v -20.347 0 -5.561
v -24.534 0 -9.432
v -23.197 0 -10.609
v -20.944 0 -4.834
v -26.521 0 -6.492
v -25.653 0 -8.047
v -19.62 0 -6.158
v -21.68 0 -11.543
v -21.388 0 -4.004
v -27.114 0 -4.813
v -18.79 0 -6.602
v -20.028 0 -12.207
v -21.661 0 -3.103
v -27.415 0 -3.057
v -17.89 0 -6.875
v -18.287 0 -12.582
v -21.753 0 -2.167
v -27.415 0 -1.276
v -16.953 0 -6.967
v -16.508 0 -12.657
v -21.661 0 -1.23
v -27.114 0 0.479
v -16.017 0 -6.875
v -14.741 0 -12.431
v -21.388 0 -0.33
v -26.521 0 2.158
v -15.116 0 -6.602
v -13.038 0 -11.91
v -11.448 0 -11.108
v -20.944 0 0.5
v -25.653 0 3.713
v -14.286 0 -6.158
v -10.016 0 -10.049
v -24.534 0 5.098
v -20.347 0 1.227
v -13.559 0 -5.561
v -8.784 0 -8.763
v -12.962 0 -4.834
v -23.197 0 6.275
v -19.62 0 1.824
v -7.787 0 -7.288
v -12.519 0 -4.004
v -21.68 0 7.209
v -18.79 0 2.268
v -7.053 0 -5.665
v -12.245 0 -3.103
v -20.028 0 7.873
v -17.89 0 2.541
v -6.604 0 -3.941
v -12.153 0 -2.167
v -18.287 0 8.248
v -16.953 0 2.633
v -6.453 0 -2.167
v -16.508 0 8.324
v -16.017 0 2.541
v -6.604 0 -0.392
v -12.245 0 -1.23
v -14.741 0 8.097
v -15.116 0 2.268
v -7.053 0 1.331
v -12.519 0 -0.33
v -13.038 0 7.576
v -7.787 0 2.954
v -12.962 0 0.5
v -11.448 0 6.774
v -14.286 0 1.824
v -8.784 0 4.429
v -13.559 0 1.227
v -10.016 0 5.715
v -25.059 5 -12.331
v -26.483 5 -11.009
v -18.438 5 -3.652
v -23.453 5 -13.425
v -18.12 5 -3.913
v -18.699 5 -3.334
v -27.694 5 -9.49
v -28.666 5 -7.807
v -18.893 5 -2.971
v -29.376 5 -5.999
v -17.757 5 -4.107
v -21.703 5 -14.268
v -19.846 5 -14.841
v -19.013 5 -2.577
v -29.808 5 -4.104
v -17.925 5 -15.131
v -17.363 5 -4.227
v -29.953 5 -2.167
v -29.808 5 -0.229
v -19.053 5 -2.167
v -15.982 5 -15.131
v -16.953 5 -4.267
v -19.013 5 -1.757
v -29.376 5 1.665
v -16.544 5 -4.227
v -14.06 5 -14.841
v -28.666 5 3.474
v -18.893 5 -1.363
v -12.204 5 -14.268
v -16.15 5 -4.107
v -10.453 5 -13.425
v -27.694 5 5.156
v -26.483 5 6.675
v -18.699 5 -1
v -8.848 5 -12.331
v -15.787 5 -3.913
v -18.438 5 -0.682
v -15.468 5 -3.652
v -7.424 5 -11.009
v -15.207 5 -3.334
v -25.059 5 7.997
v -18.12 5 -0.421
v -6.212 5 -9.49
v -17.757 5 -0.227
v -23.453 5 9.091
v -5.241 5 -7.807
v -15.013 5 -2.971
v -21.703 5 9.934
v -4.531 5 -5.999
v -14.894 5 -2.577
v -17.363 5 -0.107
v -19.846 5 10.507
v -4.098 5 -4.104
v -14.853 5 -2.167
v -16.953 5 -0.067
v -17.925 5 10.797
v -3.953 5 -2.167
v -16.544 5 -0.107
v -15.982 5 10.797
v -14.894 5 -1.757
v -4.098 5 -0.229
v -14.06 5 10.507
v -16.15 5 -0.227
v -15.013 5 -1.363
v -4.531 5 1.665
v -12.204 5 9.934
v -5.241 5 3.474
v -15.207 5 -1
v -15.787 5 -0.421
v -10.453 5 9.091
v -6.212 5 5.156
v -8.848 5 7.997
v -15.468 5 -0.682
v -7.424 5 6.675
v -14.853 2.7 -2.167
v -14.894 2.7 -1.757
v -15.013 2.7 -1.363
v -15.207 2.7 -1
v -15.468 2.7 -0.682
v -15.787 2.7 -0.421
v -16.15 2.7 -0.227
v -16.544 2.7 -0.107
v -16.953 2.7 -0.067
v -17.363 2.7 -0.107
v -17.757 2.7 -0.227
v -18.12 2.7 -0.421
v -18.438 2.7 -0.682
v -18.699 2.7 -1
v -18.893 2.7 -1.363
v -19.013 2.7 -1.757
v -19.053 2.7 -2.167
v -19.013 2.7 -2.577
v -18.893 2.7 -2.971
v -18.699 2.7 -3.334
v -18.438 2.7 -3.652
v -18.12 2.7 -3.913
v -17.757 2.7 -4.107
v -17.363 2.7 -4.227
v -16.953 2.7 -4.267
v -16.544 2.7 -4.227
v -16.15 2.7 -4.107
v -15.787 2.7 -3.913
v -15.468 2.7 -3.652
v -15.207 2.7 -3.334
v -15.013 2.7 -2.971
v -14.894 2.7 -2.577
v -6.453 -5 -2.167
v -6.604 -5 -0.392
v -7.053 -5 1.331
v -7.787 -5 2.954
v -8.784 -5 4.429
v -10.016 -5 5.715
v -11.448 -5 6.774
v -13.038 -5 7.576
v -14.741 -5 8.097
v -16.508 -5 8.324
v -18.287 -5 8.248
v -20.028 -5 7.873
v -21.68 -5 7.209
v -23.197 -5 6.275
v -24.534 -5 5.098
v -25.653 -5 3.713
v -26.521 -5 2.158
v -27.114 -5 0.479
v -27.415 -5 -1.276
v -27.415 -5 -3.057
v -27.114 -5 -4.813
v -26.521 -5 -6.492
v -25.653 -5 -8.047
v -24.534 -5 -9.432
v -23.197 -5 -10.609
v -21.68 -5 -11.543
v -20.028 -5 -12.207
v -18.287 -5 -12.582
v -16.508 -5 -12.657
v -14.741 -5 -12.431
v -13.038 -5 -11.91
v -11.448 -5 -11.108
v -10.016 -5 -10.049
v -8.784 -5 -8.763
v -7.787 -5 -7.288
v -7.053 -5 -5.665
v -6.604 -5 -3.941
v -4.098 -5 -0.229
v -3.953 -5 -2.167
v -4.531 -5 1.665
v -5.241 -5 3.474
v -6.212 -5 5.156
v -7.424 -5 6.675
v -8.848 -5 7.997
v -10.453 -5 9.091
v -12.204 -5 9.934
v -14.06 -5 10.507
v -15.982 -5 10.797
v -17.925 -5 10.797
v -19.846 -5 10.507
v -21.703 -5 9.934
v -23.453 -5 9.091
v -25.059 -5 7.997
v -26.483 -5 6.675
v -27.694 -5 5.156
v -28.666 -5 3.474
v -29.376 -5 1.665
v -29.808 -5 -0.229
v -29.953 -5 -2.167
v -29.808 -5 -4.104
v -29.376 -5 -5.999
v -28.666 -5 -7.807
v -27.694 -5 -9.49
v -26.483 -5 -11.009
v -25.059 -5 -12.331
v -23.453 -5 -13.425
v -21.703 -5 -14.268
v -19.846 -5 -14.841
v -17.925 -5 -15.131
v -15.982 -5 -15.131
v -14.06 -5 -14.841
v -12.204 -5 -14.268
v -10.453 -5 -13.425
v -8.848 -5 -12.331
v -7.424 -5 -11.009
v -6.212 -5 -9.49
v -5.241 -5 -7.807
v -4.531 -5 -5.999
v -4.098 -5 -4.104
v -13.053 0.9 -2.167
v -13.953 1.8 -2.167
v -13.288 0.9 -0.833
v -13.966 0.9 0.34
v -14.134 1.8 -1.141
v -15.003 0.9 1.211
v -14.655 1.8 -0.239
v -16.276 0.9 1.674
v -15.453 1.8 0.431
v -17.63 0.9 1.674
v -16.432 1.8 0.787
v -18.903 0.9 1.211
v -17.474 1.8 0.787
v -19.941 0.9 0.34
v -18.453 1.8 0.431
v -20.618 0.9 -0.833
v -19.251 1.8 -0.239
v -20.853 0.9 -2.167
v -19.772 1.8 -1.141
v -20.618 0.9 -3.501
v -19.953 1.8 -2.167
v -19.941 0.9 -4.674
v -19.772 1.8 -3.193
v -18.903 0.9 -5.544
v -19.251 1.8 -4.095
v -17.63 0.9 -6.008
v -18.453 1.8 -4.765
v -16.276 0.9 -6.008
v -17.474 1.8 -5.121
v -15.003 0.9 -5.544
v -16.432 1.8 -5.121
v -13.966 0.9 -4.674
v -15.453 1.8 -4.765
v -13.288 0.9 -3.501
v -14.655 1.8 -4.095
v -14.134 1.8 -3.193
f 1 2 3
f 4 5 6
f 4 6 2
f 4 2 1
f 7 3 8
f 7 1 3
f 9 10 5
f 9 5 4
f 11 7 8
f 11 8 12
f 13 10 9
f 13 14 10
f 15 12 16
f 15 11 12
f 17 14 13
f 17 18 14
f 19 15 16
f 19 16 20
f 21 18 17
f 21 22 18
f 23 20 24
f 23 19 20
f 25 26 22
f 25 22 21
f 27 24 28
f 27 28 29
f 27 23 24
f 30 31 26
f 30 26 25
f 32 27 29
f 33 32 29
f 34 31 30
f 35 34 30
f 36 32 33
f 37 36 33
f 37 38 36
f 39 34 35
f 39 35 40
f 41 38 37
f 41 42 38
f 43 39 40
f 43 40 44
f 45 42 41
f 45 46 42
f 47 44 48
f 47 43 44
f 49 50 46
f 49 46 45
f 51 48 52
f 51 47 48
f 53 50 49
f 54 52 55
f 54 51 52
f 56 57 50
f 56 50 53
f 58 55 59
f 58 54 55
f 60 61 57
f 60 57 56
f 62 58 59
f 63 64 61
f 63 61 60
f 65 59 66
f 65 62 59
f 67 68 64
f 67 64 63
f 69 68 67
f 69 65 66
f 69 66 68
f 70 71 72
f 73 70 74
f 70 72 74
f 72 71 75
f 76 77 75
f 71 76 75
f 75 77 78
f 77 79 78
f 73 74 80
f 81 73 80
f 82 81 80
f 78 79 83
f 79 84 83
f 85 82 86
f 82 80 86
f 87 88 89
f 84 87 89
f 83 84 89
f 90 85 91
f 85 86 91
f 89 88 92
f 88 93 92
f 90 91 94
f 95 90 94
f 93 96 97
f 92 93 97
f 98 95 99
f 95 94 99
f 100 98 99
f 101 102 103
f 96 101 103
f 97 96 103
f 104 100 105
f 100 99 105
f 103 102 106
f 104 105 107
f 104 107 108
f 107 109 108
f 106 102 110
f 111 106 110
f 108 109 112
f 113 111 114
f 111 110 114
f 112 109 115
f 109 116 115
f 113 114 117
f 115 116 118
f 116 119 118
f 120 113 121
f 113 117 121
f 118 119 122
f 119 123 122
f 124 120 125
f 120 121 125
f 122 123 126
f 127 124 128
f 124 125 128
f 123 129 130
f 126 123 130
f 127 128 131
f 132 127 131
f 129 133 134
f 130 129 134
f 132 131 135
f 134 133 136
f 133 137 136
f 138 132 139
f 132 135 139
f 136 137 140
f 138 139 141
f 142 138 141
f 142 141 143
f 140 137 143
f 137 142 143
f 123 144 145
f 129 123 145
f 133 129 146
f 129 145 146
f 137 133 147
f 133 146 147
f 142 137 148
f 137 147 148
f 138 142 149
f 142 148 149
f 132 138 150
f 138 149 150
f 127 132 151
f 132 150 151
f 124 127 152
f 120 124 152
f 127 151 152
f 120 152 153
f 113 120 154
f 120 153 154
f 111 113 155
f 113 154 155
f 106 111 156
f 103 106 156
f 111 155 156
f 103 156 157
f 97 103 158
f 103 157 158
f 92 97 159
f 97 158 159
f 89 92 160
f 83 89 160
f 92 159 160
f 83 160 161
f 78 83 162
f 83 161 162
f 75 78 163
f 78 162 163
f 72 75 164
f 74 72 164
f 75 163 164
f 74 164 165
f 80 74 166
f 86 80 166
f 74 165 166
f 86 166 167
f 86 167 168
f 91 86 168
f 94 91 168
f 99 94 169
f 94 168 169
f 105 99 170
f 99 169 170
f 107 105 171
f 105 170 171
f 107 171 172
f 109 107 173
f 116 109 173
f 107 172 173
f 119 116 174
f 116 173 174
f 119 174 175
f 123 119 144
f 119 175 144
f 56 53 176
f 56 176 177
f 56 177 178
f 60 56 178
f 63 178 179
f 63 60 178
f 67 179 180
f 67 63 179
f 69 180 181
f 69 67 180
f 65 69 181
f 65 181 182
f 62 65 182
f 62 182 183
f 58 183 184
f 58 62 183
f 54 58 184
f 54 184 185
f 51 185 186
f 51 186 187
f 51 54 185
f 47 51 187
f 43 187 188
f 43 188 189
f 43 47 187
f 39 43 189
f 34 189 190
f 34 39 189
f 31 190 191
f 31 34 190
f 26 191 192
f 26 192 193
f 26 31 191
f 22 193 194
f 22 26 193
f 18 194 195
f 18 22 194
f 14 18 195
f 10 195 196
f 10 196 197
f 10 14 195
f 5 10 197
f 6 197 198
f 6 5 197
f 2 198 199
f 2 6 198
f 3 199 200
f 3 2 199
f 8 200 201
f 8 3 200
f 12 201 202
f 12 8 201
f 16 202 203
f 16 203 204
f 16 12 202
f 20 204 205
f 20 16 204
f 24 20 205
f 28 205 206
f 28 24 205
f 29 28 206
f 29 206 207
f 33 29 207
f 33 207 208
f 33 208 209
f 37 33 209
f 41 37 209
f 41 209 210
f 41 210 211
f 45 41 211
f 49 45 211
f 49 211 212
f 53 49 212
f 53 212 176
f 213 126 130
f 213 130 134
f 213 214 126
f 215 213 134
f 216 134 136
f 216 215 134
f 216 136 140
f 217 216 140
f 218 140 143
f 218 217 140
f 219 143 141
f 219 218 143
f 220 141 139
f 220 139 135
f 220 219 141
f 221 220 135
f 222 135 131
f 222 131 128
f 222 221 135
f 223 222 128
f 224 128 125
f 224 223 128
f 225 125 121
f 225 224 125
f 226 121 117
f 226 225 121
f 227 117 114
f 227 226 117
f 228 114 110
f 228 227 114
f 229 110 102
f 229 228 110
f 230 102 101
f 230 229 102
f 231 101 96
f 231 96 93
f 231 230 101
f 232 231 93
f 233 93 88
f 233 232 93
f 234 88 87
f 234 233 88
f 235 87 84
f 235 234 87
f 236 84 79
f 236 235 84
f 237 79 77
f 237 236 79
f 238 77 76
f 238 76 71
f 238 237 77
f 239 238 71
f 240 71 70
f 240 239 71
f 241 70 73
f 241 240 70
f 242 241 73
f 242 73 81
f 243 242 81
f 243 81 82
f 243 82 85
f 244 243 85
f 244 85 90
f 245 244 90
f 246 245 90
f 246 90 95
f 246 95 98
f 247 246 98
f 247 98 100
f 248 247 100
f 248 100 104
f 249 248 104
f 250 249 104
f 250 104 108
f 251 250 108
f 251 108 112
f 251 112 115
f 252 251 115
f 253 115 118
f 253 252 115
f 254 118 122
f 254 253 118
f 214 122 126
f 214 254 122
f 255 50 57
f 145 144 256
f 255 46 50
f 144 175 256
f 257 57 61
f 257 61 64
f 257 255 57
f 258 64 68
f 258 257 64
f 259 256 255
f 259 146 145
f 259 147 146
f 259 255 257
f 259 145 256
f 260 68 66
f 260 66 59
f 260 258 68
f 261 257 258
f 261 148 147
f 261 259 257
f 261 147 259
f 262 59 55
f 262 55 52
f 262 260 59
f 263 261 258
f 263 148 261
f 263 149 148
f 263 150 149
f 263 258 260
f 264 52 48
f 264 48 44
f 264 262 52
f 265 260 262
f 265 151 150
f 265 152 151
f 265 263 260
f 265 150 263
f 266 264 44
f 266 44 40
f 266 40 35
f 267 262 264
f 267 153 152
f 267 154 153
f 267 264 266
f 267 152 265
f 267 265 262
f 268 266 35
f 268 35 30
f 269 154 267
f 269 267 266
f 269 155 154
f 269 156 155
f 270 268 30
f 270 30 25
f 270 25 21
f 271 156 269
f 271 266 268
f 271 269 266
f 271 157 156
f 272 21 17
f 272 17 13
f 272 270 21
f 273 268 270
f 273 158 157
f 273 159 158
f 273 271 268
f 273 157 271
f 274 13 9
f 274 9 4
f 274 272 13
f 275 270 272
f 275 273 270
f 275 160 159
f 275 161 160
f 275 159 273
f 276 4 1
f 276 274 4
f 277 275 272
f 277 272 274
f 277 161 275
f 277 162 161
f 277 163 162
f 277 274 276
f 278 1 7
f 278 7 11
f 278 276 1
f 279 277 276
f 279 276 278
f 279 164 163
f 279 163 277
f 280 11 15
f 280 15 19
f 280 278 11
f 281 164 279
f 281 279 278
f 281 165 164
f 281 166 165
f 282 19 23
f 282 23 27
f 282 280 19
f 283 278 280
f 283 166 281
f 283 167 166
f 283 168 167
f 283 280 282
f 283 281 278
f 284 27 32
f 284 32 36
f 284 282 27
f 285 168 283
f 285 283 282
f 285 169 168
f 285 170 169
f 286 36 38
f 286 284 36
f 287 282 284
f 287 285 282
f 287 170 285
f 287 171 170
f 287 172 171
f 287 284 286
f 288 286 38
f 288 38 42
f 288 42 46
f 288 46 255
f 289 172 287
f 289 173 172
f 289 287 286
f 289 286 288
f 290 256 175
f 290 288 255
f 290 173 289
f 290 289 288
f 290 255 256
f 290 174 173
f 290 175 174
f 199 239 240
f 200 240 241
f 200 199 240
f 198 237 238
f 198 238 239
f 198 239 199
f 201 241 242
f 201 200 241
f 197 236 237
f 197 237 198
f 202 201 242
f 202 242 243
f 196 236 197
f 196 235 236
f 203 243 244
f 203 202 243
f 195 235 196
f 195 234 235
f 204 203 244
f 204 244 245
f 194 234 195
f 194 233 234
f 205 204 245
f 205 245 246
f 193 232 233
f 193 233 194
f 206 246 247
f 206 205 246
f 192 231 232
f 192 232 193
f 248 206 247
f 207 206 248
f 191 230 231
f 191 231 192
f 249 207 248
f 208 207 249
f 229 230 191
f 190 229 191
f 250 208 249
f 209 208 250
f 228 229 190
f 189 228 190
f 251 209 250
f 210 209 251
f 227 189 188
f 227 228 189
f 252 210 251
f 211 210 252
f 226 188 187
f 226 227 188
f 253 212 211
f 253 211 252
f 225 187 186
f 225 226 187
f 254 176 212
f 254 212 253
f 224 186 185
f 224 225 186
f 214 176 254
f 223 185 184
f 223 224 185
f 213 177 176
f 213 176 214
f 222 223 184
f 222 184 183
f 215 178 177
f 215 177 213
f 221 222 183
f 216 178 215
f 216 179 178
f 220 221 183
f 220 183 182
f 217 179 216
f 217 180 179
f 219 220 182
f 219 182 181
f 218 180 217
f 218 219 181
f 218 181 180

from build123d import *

# Parameters (mm, degrees)
F0_R     = 13
F0_R_2   = 10.5
F1_DEPTH = 5
F0_R_3   = 2.1
F2_DEPTH = 5
F3_SIZE2 = 2.7
F3_SIZE  = 2.7


with BuildPart() as f1:
    # F0 (on Front) → F1 (new body)
    with BuildSketch(Plane.XZ):
        with Locations((-16.9531982392, -2.1669319831)):
            Circle(F0_R)
        with Locations((-16.9531982392, -2.1669319831)):
            Circle(F0_R_2, mode=Mode.SUBTRACT)
    extrude(amount=F1_DEPTH)

    # F0 (on Front) → F2 (join)
    with BuildSketch(Plane.XZ):
        with Locations((-16.9531982392, -2.1669319831)):
            Circle(F0_R)
        with Locations((-16.9531982392, -2.1669319831)):
            Circle(F0_R_2, mode=Mode.SUBTRACT)
        with Locations((-16.9531982392, -2.1669319831)):
            Circle(F0_R_2)
        with Locations((-16.9531982392, -2.1669319831)):
            Circle(F0_R_3, mode=Mode.SUBTRACT)
    extrude(amount=-F2_DEPTH)

    # F3
    f3_edges = [f1.edges().sort_by_distance(p)[0] for p in [
        (-19.053198, 0, -2.166932),
    ]]
    chamfer(f3_edges, length=F3_SIZE, length2=F3_SIZE2)


solid = f1.part
